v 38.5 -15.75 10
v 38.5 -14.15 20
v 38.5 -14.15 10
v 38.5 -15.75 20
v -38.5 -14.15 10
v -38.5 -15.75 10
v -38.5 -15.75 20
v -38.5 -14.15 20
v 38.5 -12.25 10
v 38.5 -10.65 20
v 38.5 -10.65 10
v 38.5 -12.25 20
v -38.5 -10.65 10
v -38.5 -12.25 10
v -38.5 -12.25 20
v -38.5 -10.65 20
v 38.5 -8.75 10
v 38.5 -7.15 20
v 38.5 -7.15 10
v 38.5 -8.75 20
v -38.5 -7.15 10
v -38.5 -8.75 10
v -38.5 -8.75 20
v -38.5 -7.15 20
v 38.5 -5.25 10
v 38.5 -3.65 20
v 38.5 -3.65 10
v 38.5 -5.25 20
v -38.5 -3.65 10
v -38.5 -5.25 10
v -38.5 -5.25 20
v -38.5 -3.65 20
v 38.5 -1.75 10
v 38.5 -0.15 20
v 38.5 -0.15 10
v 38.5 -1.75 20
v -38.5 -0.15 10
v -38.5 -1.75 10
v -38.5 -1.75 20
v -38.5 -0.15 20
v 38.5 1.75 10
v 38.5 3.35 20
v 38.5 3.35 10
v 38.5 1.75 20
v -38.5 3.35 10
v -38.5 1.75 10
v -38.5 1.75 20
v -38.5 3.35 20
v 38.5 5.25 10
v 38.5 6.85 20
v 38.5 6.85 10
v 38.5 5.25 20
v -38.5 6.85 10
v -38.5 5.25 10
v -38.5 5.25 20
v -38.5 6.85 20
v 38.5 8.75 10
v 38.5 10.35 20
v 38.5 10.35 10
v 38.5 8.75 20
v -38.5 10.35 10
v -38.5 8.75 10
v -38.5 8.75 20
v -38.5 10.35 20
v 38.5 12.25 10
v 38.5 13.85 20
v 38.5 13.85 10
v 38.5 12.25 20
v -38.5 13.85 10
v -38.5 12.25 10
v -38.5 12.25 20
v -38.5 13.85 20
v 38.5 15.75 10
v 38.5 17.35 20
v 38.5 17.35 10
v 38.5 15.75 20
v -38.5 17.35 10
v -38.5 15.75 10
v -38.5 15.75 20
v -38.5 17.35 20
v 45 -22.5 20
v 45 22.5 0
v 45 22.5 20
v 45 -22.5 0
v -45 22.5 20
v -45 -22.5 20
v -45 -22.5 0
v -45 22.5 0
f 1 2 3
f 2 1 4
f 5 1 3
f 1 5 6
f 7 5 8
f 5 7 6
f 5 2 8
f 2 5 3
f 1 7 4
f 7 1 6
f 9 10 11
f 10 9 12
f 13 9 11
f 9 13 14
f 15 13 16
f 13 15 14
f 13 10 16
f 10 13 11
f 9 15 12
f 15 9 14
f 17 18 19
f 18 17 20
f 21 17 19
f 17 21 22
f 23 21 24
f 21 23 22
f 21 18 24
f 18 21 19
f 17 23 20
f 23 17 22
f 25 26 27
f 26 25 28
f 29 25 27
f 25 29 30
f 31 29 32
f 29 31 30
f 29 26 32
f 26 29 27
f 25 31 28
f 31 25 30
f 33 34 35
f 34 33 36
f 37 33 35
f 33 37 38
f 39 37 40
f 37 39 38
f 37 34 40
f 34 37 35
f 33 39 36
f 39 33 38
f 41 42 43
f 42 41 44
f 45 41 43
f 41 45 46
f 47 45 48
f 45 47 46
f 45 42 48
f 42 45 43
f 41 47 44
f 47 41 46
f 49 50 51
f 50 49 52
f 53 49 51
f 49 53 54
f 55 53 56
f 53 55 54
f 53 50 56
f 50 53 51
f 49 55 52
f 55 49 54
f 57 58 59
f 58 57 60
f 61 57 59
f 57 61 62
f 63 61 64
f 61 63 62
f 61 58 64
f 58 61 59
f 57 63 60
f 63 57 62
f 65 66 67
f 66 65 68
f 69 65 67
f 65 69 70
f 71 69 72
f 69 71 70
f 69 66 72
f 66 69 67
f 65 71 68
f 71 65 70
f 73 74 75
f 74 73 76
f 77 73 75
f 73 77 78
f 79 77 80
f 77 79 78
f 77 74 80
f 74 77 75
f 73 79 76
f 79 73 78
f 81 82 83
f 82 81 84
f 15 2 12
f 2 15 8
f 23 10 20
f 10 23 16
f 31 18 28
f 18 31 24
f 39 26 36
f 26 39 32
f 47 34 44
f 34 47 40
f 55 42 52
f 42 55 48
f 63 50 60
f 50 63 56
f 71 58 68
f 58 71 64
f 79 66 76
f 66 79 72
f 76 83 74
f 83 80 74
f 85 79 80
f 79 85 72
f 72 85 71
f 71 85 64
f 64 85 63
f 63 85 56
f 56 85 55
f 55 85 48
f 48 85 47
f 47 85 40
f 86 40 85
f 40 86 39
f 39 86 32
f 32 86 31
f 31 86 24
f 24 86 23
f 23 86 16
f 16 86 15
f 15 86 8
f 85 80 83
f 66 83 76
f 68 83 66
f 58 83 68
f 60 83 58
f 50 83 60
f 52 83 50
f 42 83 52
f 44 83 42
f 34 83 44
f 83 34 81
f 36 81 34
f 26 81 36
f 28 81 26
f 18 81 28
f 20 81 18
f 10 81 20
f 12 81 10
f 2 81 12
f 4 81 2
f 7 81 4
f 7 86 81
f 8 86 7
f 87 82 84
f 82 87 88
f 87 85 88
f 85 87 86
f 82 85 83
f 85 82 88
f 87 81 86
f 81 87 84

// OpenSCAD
// Microscope slide drying rack
// Print orientation: base block flat on the bed, slots open upward (+Z)

// ---------------- Parameters ----------------
block_len    = 90;    // base block length along X (mm)
block_wid    = 45;    // base block width along Y (mm)
block_h      = 20;    // base block height along Z (mm)

slot_len     = 77;    // slot length along X (mm)
slot_w       = 1.6;   // slot width along Y (mm)
slot_depth   = 10;    // slot depth from top face (mm)
slot_count   = 10;    // number of slots
slot_pitch   = 3.5;   // centre-to-centre slot spacing along Y (mm)

eps          = 0.5;   // overcut past the top face to avoid coplanar faces (mm)

$fn = 64;

// ---------------- Model ----------------
difference() {
    // Base block, centred in X and Y, sitting on z = 0
    translate([-block_len/2, -block_wid/2, 0])
        cube([block_len, block_wid, block_h]);

    // Slot group, centred on the block in X and Y
    for (i = [0 : slot_count - 1]) {
        y = (i - (slot_count - 1)/2) * slot_pitch;
        translate([-slot_len/2, y, block_h - slot_depth])
            cube([slot_len, slot_w, slot_depth + eps]);
    }
}
